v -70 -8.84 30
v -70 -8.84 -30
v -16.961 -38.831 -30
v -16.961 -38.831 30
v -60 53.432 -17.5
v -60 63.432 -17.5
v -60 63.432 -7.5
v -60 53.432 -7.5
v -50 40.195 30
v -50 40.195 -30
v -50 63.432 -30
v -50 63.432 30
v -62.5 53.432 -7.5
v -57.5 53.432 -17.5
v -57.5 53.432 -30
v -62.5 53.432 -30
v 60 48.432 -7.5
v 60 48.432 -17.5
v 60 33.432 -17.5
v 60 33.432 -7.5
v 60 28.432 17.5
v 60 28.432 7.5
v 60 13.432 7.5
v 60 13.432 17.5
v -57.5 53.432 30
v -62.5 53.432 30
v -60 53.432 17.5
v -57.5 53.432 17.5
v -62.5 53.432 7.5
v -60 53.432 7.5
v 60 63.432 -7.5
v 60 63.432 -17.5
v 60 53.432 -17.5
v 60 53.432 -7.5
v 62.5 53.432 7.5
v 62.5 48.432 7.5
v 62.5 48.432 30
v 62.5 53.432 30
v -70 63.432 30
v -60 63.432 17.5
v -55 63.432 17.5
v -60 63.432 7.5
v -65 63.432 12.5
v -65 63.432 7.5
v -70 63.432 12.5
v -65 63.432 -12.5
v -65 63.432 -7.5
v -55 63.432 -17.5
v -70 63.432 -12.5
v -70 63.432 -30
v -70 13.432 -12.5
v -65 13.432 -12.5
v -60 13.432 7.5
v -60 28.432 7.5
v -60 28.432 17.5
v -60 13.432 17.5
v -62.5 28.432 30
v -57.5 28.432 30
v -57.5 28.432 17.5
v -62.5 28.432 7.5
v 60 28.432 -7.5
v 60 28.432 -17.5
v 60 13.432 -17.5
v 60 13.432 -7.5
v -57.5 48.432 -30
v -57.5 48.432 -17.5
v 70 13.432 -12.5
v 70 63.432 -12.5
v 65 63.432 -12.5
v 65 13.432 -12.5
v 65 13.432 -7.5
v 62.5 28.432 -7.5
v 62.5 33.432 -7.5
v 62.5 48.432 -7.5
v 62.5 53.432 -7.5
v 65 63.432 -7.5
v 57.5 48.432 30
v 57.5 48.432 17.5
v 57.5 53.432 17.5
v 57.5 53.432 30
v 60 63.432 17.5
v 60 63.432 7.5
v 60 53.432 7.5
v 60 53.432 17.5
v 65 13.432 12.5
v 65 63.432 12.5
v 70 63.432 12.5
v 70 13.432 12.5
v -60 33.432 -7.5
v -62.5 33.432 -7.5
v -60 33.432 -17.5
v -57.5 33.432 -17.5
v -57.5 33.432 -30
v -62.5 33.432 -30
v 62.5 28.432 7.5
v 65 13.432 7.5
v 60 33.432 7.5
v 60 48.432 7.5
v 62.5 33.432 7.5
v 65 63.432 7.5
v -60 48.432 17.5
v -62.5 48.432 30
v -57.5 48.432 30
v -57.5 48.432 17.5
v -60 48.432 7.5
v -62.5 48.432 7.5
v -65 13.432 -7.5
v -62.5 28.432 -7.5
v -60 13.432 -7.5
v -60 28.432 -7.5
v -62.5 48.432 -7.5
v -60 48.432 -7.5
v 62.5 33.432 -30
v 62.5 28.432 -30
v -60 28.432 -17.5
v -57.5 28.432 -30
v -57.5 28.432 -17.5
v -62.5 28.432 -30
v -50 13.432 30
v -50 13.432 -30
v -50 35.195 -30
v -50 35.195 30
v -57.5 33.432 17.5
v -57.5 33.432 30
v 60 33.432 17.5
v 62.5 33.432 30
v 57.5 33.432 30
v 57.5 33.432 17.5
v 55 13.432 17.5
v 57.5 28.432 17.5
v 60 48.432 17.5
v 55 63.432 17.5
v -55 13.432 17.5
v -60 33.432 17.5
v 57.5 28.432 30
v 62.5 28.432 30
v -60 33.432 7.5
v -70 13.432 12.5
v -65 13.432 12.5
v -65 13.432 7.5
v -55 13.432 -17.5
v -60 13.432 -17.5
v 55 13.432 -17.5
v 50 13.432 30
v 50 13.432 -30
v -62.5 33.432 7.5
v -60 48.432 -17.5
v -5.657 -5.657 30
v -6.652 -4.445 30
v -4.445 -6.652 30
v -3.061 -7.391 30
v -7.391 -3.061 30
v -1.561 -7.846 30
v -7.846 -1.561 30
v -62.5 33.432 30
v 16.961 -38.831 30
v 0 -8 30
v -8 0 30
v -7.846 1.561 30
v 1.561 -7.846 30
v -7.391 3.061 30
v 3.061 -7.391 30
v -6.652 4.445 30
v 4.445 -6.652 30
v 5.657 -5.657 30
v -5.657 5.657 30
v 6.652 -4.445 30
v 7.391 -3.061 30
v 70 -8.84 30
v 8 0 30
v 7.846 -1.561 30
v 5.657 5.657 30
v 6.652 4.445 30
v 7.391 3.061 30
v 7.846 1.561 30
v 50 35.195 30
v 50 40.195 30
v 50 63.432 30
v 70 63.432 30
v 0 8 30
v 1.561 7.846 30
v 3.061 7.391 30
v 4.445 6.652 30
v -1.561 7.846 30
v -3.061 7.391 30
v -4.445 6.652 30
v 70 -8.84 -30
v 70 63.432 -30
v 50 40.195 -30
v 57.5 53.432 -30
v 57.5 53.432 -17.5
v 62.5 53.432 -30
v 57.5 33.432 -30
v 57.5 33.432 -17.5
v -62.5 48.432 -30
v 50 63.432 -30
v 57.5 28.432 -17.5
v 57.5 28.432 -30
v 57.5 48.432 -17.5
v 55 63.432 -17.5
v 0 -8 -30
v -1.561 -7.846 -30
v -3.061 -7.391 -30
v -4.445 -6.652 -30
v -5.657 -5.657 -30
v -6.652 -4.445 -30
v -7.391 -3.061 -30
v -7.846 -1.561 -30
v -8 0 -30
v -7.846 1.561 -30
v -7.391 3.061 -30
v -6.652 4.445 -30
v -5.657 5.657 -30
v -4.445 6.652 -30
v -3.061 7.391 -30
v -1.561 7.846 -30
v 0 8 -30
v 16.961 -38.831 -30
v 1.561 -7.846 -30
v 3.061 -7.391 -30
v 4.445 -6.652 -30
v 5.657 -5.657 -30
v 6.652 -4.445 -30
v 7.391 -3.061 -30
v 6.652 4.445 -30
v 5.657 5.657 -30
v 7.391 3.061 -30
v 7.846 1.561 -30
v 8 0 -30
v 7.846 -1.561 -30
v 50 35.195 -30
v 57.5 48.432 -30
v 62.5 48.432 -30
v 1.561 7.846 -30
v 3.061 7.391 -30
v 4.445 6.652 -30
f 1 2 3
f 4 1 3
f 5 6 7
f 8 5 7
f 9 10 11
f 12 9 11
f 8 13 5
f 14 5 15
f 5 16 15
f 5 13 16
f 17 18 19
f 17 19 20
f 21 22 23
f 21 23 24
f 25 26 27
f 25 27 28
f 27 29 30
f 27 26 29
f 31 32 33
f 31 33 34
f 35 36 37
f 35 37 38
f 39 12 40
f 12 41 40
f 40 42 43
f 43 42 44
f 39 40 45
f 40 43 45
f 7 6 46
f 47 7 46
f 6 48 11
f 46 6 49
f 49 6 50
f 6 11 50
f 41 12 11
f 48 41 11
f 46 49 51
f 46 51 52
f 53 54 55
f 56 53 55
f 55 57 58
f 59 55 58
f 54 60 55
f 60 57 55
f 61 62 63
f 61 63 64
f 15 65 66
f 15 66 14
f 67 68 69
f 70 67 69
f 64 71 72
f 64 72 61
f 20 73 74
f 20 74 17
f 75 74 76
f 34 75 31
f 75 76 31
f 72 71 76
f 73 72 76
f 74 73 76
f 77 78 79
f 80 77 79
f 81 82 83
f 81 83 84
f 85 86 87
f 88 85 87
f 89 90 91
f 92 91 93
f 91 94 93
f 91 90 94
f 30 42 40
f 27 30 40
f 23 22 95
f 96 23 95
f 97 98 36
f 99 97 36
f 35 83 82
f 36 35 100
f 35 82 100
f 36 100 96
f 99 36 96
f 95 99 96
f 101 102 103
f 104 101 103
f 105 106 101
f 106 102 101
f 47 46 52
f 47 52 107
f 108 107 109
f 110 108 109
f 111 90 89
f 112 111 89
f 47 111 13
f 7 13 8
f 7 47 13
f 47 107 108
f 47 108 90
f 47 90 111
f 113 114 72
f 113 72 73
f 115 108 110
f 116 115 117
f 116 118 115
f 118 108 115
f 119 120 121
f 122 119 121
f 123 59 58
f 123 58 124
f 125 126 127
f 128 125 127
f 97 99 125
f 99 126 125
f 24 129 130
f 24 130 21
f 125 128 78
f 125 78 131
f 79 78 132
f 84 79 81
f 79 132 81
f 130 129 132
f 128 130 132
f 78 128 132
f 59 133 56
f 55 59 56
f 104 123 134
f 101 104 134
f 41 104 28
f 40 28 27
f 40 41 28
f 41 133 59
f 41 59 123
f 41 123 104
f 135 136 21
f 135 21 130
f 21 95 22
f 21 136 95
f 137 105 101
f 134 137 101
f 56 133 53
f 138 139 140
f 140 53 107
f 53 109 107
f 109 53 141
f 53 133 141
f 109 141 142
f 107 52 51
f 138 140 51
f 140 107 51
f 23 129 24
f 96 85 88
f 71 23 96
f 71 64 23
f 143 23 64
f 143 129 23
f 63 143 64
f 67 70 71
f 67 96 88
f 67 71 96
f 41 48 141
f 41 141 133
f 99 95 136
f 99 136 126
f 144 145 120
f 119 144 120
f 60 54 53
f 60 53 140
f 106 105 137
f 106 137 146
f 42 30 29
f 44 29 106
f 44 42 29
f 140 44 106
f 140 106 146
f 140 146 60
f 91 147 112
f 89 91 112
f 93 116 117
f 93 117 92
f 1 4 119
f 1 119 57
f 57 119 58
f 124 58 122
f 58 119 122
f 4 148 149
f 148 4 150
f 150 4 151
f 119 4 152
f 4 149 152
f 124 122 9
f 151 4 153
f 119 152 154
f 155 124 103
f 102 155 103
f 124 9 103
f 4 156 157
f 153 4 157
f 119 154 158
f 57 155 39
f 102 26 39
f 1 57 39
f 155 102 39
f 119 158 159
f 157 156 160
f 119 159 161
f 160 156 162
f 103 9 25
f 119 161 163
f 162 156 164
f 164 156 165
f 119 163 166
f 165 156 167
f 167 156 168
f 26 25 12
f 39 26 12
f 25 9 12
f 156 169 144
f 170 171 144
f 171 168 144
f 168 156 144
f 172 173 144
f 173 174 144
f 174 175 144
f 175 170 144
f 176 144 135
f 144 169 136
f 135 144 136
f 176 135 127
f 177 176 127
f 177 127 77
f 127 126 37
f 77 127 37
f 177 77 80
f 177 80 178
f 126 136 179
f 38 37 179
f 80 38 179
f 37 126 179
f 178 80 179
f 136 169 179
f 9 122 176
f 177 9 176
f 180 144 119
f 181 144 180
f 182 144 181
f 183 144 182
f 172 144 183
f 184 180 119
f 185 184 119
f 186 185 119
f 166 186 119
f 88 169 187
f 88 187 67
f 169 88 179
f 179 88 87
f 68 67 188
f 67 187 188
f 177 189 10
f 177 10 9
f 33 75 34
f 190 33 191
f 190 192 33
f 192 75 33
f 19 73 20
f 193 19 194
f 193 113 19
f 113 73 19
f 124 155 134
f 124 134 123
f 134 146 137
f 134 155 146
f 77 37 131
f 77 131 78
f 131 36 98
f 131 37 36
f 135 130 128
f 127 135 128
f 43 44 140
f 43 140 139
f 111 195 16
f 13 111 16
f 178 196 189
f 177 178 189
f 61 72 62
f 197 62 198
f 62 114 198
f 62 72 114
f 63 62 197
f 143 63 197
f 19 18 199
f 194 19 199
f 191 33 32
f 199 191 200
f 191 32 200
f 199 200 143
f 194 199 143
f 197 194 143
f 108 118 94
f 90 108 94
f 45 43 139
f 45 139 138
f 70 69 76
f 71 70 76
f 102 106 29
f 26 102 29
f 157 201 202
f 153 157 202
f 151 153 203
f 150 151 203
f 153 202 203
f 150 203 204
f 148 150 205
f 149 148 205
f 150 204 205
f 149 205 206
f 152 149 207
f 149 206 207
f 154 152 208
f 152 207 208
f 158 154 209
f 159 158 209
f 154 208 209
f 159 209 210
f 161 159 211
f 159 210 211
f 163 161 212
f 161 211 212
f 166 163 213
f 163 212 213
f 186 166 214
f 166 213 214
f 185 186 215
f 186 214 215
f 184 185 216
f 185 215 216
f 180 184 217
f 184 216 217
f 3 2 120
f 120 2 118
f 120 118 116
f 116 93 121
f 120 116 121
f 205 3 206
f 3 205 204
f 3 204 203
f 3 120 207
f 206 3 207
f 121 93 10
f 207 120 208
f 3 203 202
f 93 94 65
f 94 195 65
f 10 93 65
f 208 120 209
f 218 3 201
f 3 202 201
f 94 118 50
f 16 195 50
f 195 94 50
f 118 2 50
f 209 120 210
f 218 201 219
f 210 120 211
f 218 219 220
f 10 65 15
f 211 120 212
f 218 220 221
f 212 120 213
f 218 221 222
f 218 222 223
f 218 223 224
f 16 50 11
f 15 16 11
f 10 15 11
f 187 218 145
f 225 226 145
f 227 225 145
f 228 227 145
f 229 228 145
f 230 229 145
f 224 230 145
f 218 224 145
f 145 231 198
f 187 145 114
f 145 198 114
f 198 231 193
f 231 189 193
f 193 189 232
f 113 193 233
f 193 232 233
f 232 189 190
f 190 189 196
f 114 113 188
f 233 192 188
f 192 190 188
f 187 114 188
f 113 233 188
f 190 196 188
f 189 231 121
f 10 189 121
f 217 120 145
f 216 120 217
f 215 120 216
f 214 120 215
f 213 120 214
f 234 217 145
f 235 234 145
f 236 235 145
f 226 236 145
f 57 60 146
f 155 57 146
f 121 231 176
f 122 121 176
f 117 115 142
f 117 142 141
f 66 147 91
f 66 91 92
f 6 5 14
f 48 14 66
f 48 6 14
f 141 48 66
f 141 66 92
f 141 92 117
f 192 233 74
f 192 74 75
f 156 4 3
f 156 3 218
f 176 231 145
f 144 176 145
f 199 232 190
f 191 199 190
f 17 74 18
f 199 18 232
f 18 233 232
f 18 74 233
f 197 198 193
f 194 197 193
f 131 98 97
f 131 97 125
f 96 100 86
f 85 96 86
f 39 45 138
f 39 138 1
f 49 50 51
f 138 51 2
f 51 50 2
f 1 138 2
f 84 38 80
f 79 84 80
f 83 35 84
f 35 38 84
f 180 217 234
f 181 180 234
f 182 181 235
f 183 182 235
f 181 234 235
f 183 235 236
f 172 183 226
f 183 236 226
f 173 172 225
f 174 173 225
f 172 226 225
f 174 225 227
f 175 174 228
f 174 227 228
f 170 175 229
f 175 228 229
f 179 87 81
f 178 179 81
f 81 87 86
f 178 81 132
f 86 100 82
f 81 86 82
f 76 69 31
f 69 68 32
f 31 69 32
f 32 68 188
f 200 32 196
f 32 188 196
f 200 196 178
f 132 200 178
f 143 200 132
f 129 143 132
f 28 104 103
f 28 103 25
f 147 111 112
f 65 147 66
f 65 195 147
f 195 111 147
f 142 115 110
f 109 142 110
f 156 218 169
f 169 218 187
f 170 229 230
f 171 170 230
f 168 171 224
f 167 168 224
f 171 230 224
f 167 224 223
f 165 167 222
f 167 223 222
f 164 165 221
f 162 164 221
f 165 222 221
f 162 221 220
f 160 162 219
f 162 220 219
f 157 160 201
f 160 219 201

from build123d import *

# Parameters (mm, degrees)
BOSS_EXTRUDE2_DEPTH            = 30
BOSS_EXTRUDE2_DEPTH_BACK       = 30
EXTRUDE_THIN2_DEPTH            = 25
EXTRUDE_THIN2_DEPTH_BACK       = 25
SKETCH2_W                      = 60
SKETCH2_H                      = 5
BOSS_EXTRUDE3_DEPTH            = 100
BOSS_EXTRUDE4_DEPTH            = 30
BOSS_EXTRUDE4_DEPTH_BACK       = 30
CUT_EXTRUDE2_REACH             = 143.361
SKETCH4_W                      = 60
SKETCH4_H                      = 5
CUT_EXTRUDE2_DIRECTION_2_REACH = 143.361
BOSS_EXTRUDE5_DEPTH            = 30
BOSS_EXTRUDE5_DEPTH_BACK       = 30
DRONE_ARM_FIT_CUT_DEPTH        = 50
CUT_EXTRUDE3_START             = -60
SKETCH8_W                      = 5
SKETCH8_H                      = 5
CUT_EXTRUDE3_DEPTH             = 60


with BuildPart() as part:
    # Sketch1 → Boss-Extrude2 (new, two sides: drawn at the far end of the back side and taken through both)
    with BuildSketch(Plane.XY.offset(-BOSS_EXTRUDE2_DEPTH_BACK)):
        Polygon((-13.01396445, -23.830717844), (0, -23.830717844), (0, -18.830717844), (-11.698214449, -18.830717844), (-50, 2.827283512), (-50, 13.432214294), (-55, 13.432214294), (-55, -0.089432632), align=None)
        Polygon((0, -18.830717844), (0, -23.830717844), (13.01396445, -23.830717844), (55, -0.089432632), (55, 13.432214294), (50, 13.432214294), (50, 2.827283512), (11.698214449, -18.830717844), align=None)
        with BuildLine():
            Line((-11.698214449, -18.830717844), (0, -18.830717844))
            Line((0, -18.830717844), (0, -8))
            ThreePointArc((0, -8), (-8, 0), (0, 8))
            Line((0, 8), (0, 13.432214294))
            Line((0, 13.432214294), (-50, 13.432214294))
            Line((-50, 13.432214294), (-50, 2.827283512))
            Line((-50, 2.827283512), (-11.698214449, -18.830717844))
        make_face()
        with BuildLine():
            Line((0, -8), (0, -18.830717844))
            Line((0, -18.830717844), (11.698214449, -18.830717844))
            Line((11.698214449, -18.830717844), (50, 2.827283512))
            Line((50, 2.827283512), (50, 13.432214294))
            Line((50, 13.432214294), (0, 13.432214294))
            Line((0, 13.432214294), (0, 8))
            ThreePointArc((0, 8), (5.656854249, 5.656854249), (8, 0))
            ThreePointArc((8, 0), (5.656854249, -5.656854249), (0, -8))
        make_face()
    extrude(amount=BOSS_EXTRUDE2_DEPTH + BOSS_EXTRUDE2_DEPTH_BACK)

    # Sketch1<5> → Extrude-Thin2 (add, two sides: drawn at the far end of the back side and taken through both)
    with BuildSketch(Plane.XY.offset(-EXTRUDE_THIN2_DEPTH_BACK)):
        Polygon((50, 13.432214294), (50, 38.432214294), (50, 63.432214294), (-50, 63.432214294), (-50, 38.432214294), (-50, 13.432214294), (-55, 13.432214294), (-55, 38.432214294), (-55, 68.432214294), (55, 68.432214294), (55, 38.432214294), (55, 13.432214294), align=None)
    extrude(amount=EXTRUDE_THIN2_DEPTH + EXTRUDE_THIN2_DEPTH_BACK)

    # Sketch2 → Boss-Extrude3 (add)
    with BuildSketch(Plane.ZY.offset(-50)):
        with Locations((0, 37.694873029)):
            Rectangle(SKETCH2_W, SKETCH2_H)
    extrude(amount=BOSS_EXTRUDE3_DEPTH)

    # Sketch1<6> → Boss-Extrude4 (add, two sides: drawn at the far end of the back side and taken through both)
    with BuildSketch(Plane.XY.offset(-BOSS_EXTRUDE4_DEPTH_BACK)):
        Polygon((-55, -0.089432632), (-55, 13.432214294), (-70, 13.432214294), (-70, -8.839581066), (-16.961214453, -38.830717844), (16.961214453, -38.830717844), (70, -8.839581066), (70, 13.432214294), (55, 13.432214294), (55, -0.089432632), (13.01396445, -23.830717844), (-13.01396445, -23.830717844), align=None)
    extrude(amount=BOSS_EXTRUDE4_DEPTH + BOSS_EXTRUDE4_DEPTH_BACK)

    # Cut-Extrude2: up to this face of the body (flat: up to its plane)
    cut_extrude2_end = Plane(part.part.faces().sort_by_distance((-55, 40.932214294, 0))[0])
    # Sketch4 → Cut-Extrude2 (cut, up to the picked face)
    with BuildSketch(Plane(origin=(-50, 0, 0), x_dir=(0, 0, -1), z_dir=(1, 0, 0)), mode=Mode.PRIVATE) as cut_extrude2_sk1:
        with Locations((0, 65.932214294)):
            Rectangle(SKETCH4_W, SKETCH4_H)
    cut_extrude2_tool1 = split(extrude(cut_extrude2_sk1.sketch, amount=-CUT_EXTRUDE2_REACH, mode=Mode.PRIVATE), bisect_by=cut_extrude2_end, keep=Keep.BOTH, mode=Mode.PRIVATE)
    add(cut_extrude2_tool1.solids().sort_by(Axis((-50, 65.932214, 0), (-1, 0, 0)))[0], mode=Mode.SUBTRACT)

    # Cut-Extrude2 direction 2: up to this face of the body (flat: up to its plane)
    cut_extrude2_direction_2_end = Plane(part.part.faces().sort_by_distance((55, 40.932214294, 0))[0])
    # Sketch4 → Cut-Extrude2 direction 2 (cut, up to the picked face)
    with BuildSketch(Plane(origin=(-50, 0, 0), x_dir=(0, 0, -1), z_dir=(1, 0, 0)), mode=Mode.PRIVATE) as cut_extrude2_direction_2_sk1:
        with Locations((0, 65.932214294)):
            Rectangle(SKETCH4_W, SKETCH4_H)
    cut_extrude2_direction_2_tool1 = split(extrude(cut_extrude2_direction_2_sk1.sketch, amount=CUT_EXTRUDE2_DIRECTION_2_REACH, mode=Mode.PRIVATE), bisect_by=cut_extrude2_direction_2_end, keep=Keep.BOTH, mode=Mode.PRIVATE)
    add(cut_extrude2_direction_2_tool1.solids().sort_by(Axis((-50, 65.932214, 0), (1, 0, 0)))[0], mode=Mode.SUBTRACT)

    # Sketch1<7> → Boss-Extrude5 (add, two sides: drawn at the far end of the back side and taken through both)
    with BuildSketch(Plane.XY.offset(-BOSS_EXTRUDE5_DEPTH_BACK)):
        Polygon((-70, 13.432214294), (-55, 13.432214294), (-50, 13.432214294), (-50, 38.432214294), (-50, 63.432214294), (-70, 63.432214294), (-70, 38.432214294), align=None)
        Polygon((50, 38.432214294), (50, 13.432214294), (55, 13.432214294), (70, 13.432214294), (70, 38.432214294), (70, 63.432214294), (50, 63.432214294), align=None)
    extrude(amount=BOSS_EXTRUDE5_DEPTH + BOSS_EXTRUDE5_DEPTH_BACK)

    # Sketch7 → Drone Arm fit cut (cut)
    with BuildSketch(Plane(origin=(0, 63.432214294, 0), x_dir=(1, 0, 0), z_dir=(0, 1, 0))):
        Polygon((-70, -12.5), (-70, 12.5), (-65, 12.5), (-65, 7.5), (-60, 7.5), (-60, 12.5), (-60, 17.5), (-55, 17.5), (-55, -17.5), (-60, -17.5), (-60, -12.5), (-60, -7.5), (-65, -7.5), (-65, -12.5), align=None)
    drone_arm_fit_cut = extrude(amount=-DRONE_ARM_FIT_CUT_DEPTH, mode=Mode.SUBTRACT)

    # Mirror Drone arm fit cut: Drone Arm fit cut across plane
    add(drone_arm_fit_cut.mirror(Plane(origin=(0, 0, 0), x_dir=(0, 0, 1), z_dir=(1, 0, 0))), mode=Mode.SUBTRACT)

    # Sketch8 → Cut-Extrude3 (cut)
    with BuildSketch(Plane.XY.offset(30).offset(CUT_EXTRUDE3_START)):
        with Locations((-60, 50.932214294)):
            Rectangle(SKETCH8_W, SKETCH8_H)
        with Locations((-60, 30.932214294)):
            Rectangle(SKETCH8_W, SKETCH8_H)
    cut_extrude3 = extrude(amount=CUT_EXTRUDE3_DEPTH, mode=Mode.SUBTRACT)

    # Mirror1: Cut-Extrude3 across plane
    add(cut_extrude3.mirror(Plane(origin=(0, 0, 0), x_dir=(0, 0, 1), z_dir=(1, 0, 0))), mode=Mode.SUBTRACT)


solid = part.part
